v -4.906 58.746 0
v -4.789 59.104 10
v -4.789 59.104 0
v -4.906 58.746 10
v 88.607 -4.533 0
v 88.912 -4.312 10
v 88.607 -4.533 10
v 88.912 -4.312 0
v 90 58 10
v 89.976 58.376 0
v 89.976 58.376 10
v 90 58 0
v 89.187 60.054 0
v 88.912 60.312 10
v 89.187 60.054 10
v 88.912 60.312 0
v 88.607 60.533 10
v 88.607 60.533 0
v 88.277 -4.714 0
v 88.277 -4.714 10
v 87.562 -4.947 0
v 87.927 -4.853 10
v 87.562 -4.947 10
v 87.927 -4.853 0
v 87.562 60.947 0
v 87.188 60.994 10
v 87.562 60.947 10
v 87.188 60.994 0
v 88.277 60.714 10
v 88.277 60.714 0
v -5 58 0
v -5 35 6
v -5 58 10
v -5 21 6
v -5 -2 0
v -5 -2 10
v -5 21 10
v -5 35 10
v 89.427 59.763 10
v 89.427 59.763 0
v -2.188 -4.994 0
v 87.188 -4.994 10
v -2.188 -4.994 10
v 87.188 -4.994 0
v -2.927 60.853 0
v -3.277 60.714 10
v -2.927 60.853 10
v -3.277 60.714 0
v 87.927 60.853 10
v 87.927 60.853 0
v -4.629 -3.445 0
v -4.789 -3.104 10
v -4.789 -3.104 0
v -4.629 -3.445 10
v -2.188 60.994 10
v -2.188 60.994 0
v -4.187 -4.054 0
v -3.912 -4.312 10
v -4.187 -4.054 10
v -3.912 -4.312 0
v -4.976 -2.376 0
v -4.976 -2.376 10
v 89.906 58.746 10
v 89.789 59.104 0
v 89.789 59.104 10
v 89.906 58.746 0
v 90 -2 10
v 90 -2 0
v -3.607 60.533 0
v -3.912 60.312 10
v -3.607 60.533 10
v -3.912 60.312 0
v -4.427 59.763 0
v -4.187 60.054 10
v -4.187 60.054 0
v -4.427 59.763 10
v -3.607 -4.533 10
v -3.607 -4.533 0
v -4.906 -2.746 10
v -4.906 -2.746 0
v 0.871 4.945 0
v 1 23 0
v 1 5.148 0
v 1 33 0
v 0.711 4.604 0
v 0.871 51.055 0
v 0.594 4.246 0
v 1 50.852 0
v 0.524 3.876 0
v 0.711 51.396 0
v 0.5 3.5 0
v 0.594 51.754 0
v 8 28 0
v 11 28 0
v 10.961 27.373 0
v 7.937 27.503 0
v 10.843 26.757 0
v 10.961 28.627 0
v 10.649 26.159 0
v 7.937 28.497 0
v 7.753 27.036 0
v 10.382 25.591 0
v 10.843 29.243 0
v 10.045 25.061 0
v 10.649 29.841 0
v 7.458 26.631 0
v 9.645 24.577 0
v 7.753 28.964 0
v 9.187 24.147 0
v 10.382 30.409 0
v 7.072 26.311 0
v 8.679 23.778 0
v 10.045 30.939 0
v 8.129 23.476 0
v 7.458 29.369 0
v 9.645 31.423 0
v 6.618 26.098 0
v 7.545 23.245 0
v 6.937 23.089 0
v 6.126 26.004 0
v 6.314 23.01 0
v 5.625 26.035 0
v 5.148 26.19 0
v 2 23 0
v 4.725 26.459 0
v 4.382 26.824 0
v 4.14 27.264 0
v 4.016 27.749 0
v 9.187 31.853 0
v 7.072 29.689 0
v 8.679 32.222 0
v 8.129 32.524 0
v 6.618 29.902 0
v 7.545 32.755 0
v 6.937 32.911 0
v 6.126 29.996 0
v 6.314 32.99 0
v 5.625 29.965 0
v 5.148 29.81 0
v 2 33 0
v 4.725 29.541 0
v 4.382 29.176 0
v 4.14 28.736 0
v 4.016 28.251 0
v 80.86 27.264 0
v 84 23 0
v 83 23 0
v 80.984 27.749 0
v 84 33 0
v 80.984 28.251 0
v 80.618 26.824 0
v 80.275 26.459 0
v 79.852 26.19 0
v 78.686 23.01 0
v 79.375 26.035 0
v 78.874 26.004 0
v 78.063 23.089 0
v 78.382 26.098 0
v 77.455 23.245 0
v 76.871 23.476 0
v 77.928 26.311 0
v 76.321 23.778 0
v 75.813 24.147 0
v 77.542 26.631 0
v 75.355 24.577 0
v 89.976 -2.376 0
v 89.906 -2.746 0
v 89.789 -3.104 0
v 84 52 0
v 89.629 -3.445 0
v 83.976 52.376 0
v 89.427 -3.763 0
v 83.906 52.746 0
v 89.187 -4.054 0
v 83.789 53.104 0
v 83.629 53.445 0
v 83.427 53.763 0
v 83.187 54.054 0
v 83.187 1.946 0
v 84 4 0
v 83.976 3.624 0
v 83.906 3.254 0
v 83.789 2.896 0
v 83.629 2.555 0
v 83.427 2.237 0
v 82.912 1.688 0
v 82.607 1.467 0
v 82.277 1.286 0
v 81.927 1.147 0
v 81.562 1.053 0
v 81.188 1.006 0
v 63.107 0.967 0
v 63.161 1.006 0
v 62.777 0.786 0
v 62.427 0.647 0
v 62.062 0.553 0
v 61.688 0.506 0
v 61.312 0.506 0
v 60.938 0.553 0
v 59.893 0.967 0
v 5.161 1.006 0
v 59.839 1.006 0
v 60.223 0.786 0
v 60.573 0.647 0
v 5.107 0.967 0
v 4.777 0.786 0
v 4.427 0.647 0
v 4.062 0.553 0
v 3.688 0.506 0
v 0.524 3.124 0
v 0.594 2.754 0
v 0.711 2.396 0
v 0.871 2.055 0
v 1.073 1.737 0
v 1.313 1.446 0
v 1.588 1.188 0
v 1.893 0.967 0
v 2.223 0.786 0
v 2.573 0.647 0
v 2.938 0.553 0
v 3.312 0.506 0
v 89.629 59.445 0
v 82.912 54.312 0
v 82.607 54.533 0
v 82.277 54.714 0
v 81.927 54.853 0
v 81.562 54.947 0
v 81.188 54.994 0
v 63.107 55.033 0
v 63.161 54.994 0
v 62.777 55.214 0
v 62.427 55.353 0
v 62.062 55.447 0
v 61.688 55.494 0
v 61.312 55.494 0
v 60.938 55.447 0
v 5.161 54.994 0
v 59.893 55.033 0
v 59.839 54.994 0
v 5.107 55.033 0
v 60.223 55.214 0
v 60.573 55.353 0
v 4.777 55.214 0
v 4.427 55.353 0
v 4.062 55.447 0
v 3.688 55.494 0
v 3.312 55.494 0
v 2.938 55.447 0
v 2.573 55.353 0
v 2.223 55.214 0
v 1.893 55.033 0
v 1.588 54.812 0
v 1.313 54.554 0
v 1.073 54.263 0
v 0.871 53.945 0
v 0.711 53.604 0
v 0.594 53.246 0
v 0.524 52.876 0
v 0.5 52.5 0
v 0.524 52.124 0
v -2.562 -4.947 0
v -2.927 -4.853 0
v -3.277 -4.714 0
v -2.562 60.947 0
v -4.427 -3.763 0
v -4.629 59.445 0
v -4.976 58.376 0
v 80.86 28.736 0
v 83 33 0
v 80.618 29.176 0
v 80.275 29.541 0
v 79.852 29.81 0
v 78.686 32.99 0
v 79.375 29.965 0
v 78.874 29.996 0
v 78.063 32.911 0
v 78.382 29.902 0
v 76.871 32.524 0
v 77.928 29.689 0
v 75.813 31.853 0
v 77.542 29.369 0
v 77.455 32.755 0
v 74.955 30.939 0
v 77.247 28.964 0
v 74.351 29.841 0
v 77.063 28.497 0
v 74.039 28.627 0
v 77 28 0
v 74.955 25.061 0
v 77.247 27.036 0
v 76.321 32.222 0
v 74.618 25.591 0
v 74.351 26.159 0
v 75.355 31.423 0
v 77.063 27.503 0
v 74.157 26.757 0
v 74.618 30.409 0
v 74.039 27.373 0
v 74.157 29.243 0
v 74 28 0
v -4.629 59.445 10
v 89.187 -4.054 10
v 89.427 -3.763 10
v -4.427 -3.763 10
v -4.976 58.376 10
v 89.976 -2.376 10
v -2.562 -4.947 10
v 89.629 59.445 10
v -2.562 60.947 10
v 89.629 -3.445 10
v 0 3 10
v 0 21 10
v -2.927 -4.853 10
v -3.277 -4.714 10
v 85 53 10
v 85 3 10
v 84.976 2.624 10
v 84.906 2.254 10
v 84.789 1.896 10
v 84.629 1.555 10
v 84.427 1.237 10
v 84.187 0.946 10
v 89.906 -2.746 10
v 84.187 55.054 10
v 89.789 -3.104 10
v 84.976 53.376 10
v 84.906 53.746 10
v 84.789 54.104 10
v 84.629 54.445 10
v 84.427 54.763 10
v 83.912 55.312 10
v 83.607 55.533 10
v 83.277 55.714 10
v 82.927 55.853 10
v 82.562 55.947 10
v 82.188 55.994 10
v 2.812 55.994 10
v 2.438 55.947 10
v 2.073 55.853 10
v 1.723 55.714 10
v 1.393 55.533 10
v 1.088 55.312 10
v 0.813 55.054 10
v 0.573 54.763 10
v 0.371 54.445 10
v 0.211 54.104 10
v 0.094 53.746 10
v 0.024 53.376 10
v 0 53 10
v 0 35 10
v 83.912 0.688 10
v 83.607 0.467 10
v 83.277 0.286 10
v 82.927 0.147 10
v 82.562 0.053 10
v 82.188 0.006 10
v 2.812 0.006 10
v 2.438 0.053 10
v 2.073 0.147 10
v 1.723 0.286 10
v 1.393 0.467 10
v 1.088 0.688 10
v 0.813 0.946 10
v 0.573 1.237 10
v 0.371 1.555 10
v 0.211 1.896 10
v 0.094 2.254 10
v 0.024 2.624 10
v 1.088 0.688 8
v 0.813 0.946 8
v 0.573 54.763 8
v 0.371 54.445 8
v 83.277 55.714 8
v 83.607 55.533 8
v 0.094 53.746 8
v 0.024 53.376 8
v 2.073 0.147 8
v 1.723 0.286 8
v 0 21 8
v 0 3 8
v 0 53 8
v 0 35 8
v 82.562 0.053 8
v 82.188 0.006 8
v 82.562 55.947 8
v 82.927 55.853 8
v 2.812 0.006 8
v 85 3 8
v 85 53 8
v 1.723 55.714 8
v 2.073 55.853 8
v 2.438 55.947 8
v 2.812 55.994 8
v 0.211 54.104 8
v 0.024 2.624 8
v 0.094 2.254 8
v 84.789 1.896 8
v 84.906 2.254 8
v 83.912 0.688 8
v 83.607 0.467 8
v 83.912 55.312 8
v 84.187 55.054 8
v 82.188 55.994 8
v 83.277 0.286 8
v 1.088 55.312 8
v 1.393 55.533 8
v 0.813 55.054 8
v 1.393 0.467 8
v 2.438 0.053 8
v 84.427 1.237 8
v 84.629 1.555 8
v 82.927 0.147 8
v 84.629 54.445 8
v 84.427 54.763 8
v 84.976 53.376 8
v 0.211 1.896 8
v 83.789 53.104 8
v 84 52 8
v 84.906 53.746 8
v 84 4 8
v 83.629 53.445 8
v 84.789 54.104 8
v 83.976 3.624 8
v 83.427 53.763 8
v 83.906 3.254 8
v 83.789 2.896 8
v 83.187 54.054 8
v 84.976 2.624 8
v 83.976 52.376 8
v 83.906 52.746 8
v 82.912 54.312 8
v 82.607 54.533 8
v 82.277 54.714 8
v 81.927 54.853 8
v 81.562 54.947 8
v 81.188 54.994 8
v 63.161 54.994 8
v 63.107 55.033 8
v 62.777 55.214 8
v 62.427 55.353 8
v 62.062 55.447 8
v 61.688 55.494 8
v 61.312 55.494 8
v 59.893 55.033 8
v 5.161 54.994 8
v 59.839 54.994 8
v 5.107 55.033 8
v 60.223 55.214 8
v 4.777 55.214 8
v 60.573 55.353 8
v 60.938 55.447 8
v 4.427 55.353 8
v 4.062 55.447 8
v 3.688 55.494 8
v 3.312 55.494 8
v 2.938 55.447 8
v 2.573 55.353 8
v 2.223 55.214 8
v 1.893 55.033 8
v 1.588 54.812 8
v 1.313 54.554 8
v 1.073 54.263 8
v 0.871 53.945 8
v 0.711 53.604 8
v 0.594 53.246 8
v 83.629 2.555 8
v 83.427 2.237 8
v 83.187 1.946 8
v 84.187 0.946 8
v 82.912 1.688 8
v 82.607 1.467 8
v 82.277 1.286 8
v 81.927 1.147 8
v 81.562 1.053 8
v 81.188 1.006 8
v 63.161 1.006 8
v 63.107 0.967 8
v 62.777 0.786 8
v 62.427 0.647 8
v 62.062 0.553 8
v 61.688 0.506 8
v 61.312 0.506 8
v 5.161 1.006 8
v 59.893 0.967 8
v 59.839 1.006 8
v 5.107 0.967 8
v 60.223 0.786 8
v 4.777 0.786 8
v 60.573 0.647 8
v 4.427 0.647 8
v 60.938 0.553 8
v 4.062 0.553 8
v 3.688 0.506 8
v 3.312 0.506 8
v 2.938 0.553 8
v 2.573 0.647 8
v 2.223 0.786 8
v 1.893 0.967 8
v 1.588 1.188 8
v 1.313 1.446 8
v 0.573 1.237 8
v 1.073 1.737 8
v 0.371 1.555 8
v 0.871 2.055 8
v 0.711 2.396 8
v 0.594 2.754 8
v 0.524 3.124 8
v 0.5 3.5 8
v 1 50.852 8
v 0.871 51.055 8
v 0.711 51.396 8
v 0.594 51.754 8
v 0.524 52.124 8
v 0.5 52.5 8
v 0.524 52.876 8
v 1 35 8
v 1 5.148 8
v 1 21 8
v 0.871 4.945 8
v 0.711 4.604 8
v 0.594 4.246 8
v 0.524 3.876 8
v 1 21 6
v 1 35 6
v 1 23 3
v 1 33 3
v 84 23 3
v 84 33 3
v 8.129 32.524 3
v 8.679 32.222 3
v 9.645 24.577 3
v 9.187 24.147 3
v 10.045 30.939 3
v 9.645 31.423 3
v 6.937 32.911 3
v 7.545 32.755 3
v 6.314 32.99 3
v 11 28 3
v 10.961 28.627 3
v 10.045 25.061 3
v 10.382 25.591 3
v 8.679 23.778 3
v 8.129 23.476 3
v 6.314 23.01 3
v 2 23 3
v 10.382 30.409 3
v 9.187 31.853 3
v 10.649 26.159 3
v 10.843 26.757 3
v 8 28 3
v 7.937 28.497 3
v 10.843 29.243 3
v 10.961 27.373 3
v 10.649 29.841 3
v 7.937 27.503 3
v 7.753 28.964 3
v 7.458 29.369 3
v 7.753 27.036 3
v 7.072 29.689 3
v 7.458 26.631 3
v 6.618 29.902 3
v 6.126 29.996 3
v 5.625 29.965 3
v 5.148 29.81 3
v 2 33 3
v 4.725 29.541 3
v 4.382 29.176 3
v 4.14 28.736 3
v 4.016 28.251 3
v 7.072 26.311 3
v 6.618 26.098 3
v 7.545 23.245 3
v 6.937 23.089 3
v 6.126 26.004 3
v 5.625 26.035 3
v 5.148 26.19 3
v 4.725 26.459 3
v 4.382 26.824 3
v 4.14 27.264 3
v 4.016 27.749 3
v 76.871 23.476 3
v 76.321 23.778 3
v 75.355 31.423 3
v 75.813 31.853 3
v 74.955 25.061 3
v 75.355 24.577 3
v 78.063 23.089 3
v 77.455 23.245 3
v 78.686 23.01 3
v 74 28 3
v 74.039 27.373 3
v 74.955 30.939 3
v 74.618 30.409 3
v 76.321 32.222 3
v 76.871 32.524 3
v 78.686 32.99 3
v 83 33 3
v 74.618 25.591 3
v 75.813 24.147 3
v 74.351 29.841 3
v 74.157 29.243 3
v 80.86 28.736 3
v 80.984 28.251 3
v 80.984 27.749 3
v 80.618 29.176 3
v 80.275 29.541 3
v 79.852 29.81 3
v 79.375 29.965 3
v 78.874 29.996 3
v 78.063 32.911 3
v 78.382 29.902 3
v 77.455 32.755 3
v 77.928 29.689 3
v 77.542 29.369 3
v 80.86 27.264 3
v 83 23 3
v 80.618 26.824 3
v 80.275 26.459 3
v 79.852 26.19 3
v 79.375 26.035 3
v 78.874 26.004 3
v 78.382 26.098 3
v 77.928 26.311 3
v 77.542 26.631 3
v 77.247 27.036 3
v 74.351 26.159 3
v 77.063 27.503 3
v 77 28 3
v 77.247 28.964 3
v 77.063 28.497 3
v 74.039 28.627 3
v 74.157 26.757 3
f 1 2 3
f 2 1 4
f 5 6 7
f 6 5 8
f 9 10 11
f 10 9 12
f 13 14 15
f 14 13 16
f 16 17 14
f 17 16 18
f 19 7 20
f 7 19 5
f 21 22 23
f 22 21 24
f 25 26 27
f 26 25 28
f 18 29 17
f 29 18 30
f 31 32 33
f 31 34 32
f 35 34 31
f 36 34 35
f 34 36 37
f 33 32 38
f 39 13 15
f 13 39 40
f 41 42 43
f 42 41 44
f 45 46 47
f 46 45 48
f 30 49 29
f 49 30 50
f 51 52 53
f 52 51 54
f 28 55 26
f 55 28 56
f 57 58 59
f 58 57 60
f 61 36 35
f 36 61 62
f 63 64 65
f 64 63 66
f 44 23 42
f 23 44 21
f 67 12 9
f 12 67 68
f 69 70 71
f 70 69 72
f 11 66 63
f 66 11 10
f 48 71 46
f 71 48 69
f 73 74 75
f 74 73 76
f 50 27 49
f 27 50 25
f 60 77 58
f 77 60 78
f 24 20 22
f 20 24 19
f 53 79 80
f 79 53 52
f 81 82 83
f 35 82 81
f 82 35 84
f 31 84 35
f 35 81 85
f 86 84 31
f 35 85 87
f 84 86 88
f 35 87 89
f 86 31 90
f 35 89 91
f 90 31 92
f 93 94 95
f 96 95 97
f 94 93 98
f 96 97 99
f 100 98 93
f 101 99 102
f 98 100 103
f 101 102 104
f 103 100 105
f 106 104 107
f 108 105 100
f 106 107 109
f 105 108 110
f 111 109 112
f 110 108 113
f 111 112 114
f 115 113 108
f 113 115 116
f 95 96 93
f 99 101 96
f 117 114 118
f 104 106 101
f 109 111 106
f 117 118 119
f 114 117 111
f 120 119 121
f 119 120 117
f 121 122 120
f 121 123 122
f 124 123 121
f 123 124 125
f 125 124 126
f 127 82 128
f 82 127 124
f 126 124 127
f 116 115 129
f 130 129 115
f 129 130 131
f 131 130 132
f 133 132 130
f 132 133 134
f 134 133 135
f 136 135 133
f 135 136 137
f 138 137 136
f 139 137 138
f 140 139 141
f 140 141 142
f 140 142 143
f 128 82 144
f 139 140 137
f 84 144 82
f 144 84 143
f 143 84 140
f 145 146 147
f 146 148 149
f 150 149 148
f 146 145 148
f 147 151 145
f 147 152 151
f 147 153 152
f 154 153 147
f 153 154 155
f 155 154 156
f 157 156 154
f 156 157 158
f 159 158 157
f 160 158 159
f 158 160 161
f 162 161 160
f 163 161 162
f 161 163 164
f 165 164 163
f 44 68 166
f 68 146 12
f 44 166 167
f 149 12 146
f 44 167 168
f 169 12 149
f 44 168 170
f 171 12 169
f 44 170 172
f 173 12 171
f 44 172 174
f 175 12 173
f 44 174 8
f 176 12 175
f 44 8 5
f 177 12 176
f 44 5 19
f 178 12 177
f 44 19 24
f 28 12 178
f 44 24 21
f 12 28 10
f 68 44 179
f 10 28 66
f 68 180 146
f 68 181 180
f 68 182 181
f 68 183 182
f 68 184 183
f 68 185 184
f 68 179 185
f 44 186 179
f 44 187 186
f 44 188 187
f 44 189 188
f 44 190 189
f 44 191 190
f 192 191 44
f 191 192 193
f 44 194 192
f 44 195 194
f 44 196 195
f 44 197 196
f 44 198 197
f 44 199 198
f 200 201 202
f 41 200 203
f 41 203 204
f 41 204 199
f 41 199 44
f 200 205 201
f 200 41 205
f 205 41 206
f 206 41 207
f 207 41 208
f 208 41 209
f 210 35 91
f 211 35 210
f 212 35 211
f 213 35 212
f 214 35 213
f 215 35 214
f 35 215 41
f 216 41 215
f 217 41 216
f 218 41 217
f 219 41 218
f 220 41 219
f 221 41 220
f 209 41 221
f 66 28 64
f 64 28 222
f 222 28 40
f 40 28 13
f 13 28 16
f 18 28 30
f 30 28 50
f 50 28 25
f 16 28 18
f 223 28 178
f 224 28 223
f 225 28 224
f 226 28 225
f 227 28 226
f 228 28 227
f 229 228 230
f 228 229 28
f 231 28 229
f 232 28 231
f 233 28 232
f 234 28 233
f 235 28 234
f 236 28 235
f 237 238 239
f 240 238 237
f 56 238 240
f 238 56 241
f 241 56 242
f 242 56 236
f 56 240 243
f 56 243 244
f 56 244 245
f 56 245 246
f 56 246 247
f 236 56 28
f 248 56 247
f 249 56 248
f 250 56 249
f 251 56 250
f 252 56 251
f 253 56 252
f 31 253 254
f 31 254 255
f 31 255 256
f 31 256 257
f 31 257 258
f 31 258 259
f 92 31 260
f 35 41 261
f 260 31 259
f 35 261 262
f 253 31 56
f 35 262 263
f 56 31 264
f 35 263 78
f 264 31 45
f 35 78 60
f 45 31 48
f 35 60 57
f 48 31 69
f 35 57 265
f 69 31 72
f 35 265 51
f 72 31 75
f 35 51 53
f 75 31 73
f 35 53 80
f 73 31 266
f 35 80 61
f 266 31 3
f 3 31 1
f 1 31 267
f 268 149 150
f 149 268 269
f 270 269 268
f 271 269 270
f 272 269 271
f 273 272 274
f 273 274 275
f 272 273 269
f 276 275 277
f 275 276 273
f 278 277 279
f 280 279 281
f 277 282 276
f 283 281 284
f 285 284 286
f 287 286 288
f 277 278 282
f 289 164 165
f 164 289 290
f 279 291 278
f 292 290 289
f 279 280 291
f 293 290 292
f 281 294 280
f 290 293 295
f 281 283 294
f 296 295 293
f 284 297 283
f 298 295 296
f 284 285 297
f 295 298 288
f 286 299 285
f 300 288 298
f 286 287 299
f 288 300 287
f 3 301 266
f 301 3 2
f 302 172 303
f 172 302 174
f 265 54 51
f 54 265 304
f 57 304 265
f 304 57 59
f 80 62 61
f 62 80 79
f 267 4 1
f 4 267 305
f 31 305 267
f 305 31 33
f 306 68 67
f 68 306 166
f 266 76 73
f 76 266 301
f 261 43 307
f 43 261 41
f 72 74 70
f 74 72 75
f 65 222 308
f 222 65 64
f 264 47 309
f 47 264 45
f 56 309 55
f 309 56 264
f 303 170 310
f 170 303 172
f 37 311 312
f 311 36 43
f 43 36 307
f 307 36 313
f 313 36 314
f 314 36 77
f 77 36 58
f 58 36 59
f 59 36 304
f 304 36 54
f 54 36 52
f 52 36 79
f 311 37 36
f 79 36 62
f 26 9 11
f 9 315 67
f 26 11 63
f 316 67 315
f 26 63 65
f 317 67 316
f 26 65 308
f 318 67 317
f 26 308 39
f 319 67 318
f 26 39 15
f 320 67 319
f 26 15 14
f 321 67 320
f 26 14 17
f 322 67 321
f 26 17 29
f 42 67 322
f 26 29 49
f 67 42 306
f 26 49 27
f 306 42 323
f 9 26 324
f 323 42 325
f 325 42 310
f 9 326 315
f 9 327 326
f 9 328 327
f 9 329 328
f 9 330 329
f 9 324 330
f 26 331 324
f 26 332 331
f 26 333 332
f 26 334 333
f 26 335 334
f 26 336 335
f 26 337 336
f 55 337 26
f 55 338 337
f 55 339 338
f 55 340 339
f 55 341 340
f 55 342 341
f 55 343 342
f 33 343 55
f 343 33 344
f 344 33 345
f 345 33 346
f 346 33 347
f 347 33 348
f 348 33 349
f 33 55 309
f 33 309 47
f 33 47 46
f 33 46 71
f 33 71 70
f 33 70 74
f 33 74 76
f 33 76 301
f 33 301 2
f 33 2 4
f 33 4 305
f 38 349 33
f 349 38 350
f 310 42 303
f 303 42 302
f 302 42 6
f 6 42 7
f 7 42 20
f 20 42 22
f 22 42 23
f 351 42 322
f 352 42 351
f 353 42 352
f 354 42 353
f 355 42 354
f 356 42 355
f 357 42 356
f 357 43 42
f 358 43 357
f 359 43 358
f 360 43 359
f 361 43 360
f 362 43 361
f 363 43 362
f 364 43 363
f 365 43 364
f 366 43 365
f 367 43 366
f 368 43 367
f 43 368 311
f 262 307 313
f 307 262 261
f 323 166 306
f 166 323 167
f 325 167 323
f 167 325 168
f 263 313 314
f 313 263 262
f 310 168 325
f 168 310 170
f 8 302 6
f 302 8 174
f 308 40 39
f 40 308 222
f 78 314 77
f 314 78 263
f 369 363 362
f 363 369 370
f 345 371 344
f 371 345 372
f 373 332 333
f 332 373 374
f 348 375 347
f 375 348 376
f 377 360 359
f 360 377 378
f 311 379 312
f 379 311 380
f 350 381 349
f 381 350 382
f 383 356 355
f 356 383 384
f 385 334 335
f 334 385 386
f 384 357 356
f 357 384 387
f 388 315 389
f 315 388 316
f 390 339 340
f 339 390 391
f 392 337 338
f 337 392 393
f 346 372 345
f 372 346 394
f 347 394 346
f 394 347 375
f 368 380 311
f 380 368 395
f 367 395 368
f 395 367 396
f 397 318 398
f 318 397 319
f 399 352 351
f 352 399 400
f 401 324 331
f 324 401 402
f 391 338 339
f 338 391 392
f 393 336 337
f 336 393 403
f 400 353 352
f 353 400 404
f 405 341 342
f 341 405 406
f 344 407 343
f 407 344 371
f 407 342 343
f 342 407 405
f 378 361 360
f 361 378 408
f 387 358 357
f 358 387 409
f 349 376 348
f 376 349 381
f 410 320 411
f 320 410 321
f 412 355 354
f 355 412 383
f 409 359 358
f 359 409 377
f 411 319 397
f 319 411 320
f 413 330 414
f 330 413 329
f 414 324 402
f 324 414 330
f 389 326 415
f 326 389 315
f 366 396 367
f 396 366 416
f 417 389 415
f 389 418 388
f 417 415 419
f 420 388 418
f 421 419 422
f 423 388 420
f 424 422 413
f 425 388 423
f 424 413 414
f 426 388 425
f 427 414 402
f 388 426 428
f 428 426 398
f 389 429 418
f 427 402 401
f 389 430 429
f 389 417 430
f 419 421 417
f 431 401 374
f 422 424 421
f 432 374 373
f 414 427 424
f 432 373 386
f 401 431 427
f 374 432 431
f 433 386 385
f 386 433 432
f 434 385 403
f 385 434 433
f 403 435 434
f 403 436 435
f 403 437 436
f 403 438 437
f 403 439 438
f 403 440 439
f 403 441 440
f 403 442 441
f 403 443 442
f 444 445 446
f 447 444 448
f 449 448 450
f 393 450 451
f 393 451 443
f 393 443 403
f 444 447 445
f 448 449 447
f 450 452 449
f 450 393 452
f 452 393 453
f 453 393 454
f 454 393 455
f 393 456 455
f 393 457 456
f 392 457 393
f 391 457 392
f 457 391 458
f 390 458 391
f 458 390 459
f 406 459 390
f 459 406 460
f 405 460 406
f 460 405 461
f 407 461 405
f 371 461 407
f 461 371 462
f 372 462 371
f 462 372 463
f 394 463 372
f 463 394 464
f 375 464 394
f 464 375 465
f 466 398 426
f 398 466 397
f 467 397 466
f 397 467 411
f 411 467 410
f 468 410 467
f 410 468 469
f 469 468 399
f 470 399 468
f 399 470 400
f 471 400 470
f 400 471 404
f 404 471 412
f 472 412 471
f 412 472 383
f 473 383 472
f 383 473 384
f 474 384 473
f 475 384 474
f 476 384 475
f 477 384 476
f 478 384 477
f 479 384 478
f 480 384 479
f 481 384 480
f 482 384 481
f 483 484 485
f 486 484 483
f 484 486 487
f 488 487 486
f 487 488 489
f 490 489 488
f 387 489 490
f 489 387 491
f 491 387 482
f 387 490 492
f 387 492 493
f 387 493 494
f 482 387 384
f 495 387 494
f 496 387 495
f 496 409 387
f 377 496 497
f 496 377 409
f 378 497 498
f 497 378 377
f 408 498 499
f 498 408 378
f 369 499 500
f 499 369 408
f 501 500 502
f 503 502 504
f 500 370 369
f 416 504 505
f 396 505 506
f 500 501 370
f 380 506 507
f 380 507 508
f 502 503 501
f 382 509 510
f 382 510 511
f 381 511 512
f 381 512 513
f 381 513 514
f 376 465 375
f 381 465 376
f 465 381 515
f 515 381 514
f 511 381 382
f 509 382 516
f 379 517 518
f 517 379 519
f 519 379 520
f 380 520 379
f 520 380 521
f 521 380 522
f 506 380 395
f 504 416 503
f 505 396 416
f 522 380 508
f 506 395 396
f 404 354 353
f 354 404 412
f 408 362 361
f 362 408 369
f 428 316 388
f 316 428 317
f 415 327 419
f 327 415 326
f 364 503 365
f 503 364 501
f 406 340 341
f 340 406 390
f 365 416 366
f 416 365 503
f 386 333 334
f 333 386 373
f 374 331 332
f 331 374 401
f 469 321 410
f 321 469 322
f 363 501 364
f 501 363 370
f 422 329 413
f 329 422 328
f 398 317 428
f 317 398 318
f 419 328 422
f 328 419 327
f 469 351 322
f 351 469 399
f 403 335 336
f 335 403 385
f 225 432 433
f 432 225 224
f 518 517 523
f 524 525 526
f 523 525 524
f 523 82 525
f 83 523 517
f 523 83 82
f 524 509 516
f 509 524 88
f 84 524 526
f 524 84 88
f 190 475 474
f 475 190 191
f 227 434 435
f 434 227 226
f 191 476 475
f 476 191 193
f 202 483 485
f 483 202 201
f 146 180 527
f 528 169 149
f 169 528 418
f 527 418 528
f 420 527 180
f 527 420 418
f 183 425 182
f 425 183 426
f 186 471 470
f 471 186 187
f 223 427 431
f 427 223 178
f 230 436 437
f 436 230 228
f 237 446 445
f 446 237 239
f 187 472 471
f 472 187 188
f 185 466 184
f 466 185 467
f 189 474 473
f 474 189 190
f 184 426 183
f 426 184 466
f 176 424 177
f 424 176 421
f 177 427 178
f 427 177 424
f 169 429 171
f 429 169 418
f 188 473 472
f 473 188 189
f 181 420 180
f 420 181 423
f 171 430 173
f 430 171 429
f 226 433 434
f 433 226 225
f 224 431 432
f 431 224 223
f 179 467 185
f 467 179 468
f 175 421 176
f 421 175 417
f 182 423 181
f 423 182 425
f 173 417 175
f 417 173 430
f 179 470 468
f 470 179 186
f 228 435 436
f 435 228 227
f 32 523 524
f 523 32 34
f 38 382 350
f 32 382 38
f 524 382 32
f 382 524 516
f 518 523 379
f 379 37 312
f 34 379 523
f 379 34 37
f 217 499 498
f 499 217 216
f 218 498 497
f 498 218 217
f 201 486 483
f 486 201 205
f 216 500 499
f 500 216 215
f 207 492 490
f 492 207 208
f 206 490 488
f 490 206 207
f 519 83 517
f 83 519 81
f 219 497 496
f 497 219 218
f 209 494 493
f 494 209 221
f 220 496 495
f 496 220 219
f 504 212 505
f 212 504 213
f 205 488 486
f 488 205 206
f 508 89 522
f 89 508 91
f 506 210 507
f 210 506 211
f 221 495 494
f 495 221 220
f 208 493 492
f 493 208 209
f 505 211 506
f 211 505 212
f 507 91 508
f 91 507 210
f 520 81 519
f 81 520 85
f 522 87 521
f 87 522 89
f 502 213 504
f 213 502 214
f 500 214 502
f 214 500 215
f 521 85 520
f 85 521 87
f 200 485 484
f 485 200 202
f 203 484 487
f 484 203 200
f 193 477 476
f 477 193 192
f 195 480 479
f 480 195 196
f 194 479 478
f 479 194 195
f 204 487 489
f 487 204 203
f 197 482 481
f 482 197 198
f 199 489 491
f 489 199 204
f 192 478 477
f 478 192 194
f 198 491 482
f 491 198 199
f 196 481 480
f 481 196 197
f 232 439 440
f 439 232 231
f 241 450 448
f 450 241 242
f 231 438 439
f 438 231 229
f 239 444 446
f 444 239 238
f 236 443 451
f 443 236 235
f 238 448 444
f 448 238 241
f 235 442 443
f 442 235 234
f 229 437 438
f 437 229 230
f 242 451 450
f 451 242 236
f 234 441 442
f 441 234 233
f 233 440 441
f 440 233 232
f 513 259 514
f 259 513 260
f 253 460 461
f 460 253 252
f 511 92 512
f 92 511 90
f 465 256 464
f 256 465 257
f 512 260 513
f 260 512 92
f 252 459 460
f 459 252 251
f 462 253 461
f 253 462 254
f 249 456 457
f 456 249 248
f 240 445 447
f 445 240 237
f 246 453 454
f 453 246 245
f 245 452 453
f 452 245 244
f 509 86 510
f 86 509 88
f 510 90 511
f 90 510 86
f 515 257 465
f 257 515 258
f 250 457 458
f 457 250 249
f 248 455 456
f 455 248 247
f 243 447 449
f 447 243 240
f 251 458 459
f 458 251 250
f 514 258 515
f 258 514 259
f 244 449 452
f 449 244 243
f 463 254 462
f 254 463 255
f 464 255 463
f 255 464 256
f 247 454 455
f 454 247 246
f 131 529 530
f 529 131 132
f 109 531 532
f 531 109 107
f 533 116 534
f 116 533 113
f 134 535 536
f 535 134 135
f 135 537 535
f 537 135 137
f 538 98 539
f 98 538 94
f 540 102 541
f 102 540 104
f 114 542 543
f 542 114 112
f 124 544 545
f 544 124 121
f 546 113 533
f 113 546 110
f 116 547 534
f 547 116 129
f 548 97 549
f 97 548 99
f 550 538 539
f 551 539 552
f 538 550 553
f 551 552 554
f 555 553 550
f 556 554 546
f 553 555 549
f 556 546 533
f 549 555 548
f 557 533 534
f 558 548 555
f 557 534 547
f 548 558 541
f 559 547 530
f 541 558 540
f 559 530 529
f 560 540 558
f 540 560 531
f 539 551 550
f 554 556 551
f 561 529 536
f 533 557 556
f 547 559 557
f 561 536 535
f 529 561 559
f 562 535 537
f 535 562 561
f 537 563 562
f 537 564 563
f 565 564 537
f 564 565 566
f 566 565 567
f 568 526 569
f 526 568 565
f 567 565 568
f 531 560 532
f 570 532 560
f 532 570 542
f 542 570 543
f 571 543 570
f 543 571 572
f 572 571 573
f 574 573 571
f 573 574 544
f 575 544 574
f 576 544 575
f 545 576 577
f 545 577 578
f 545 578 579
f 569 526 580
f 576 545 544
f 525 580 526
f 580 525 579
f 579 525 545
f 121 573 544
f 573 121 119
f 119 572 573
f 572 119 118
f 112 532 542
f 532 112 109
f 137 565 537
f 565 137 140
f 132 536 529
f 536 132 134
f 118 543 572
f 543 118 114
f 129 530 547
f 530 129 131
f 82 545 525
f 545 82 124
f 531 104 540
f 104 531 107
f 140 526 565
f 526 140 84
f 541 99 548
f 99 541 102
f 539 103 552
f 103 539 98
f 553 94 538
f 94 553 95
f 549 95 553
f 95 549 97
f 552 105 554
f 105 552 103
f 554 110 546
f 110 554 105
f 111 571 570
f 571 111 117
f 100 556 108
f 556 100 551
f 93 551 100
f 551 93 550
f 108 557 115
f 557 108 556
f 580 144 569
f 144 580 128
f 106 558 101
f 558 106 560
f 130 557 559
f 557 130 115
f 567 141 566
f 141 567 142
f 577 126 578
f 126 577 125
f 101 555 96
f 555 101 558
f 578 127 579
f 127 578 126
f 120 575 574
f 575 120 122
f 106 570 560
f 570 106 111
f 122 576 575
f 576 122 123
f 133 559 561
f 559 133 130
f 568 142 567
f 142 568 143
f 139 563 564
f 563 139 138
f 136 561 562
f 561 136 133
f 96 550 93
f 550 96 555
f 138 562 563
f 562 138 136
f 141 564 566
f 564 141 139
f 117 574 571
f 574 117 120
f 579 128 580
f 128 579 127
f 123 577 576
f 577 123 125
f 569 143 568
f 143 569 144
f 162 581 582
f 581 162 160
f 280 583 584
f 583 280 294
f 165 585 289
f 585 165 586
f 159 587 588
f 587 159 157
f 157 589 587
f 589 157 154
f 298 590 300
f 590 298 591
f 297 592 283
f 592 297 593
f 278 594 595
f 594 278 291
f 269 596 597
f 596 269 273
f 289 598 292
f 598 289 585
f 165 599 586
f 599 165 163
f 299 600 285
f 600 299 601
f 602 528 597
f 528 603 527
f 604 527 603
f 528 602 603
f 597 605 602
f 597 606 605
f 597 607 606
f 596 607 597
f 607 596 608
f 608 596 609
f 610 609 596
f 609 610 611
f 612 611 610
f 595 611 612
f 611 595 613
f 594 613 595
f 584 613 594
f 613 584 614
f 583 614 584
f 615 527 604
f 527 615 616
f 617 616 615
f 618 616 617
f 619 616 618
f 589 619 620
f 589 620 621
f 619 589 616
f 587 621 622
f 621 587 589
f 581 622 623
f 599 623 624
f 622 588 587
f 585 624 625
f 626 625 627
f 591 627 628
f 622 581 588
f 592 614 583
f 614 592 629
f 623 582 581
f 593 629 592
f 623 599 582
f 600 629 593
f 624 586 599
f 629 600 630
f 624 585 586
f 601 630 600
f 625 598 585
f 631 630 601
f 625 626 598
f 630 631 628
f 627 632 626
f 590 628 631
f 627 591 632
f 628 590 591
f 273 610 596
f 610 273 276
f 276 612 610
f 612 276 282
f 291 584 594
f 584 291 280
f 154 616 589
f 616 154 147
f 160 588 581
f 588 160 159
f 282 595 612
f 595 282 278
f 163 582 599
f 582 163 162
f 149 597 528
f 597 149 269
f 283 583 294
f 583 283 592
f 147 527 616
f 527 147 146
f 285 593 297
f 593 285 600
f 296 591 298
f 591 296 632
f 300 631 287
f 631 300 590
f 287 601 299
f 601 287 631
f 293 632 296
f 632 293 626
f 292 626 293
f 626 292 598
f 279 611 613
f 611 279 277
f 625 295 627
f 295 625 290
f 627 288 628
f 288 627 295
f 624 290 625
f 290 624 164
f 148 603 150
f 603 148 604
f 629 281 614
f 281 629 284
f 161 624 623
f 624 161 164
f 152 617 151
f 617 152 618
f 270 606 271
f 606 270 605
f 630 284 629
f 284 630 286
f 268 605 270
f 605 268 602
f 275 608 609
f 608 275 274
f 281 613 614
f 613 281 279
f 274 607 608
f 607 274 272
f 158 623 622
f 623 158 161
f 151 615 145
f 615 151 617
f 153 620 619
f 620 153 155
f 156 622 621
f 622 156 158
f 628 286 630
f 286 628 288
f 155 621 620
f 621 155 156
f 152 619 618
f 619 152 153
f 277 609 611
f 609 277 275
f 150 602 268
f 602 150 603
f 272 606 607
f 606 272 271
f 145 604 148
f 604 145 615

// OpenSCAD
//Raspberry Pi board mount
//CCBYNC Copyright Mark Benson 2016

width=85;
depth=56;
height=10;
mountingHoleClearance = 6;
mountingHoleLeftClearance = 3.5;
mountingHoleWidth = 58;
mountingHoleDepth = 49;
cornerRadius=3;
facets=50;
mountWallThickness=5; //How much thicker than the pi will this thing be?
mountLipThickness=1; //How thick will the inner lip be?

//translate([cornerRadius,cornerRadius,0])
//%cube([width,depth,height]);

difference()
{
//Board mount base
translate([0,0,0])
hull()
{
    translate([cornerRadius-mountWallThickness,cornerRadius-mountWallThickness,0])
    cylinder(r=cornerRadius, h=height, $fn=facets);
    
    translate([width-cornerRadius+mountWallThickness,cornerRadius-mountWallThickness,0])
    cylinder(r=cornerRadius, h=height, $fn=facets);
    
    translate([width-cornerRadius+mountWallThickness,depth-cornerRadius+mountWallThickness,0])
    cylinder(r=cornerRadius, h=height, $fn=facets);
    
    translate([cornerRadius-mountWallThickness,depth-cornerRadius+mountWallThickness,0])
    cylinder(r=cornerRadius, h=height, $fn=facets);
}


//Pi board cutout
translate([0,0,8])
hull()
{
    translate([cornerRadius,cornerRadius,0])
    cylinder(r=cornerRadius, h=height, $fn=facets);
    
    translate([width-cornerRadius,cornerRadius,0])
    cylinder(r=cornerRadius, h=height, $fn=facets);
    
    translate([width-cornerRadius,depth-cornerRadius,0])
    cylinder(r=cornerRadius, h=height, $fn=facets);
    
    translate([cornerRadius,depth-cornerRadius,0])
    cylinder(r=cornerRadius, h=height, $fn=facets);
}

//Material cutout (remove material that we don't need to print)
translate([0,0,0])
hull()
{
    translate([cornerRadius+mountLipThickness,cornerRadius+mountLipThickness,0])
    cylinder(r=cornerRadius, h=height, $fn=facets);
    
    translate([width-cornerRadius-mountLipThickness,cornerRadius+mountLipThickness,0])
    cylinder(r=cornerRadius, h=height, $fn=facets);
    
    translate([width-cornerRadius-mountLipThickness,depth-cornerRadius-mountLipThickness,0])
    cylinder(r=cornerRadius, h=height, $fn=facets);
    
    translate([cornerRadius+mountLipThickness,depth-cornerRadius-mountLipThickness,0])
    cylinder(r=cornerRadius, h=height, $fn=facets);
}

//cutout for SD card
translate([-10,depth/2-7,6])
cube([25,14,4]);

//cutouts for mounting holes (clear space for screw heads)

translate([mountingHoleLeftClearance,mountingHoleLeftClearance,0])
cylinder(r=cornerRadius, h=height, $fn=facets);

translate([mountingHoleLeftClearance+mountingHoleWidth,mountingHoleLeftClearance,0])
cylinder(r=cornerRadius, h=height, $fn=facets);

translate([mountingHoleLeftClearance+mountingHoleWidth,mountingHoleLeftClearance+mountingHoleDepth,0])
cylinder(r=cornerRadius, h=height, $fn=facets);

translate([mountingHoleLeftClearance,mountingHoleLeftClearance+mountingHoleDepth,0])
cylinder(r=cornerRadius, h=height, $fn=facets);



}//end of main difference

//inner self tapper screw tab left
translate([1,depth/2-5,0]) 
difference()
{
    //tab
    hull()
    {
        translate([5,5,0])
        cylinder(d=10,h=3,$fn=50);

        translate([0,0,0])
        cube([1,10,3]);
    }

    //screw hole
    translate([5,5,0])
    cylinder(d=4,h=3,$fn=25);
}

//inner self tapper screw tab right
translate([width-1,depth/2+5,0])
rotate([0,0,180])
difference()
{
    //tab
    hull()
    {
        translate([5,5,0])
        cylinder(d=10,h=3,$fn=50);

        translate([0,0,0])
        cube([1,10,3]);
    }

    //screw hole
    translate([5,5,0])
    cylinder(d=4,h=3,$fn=25);
}
